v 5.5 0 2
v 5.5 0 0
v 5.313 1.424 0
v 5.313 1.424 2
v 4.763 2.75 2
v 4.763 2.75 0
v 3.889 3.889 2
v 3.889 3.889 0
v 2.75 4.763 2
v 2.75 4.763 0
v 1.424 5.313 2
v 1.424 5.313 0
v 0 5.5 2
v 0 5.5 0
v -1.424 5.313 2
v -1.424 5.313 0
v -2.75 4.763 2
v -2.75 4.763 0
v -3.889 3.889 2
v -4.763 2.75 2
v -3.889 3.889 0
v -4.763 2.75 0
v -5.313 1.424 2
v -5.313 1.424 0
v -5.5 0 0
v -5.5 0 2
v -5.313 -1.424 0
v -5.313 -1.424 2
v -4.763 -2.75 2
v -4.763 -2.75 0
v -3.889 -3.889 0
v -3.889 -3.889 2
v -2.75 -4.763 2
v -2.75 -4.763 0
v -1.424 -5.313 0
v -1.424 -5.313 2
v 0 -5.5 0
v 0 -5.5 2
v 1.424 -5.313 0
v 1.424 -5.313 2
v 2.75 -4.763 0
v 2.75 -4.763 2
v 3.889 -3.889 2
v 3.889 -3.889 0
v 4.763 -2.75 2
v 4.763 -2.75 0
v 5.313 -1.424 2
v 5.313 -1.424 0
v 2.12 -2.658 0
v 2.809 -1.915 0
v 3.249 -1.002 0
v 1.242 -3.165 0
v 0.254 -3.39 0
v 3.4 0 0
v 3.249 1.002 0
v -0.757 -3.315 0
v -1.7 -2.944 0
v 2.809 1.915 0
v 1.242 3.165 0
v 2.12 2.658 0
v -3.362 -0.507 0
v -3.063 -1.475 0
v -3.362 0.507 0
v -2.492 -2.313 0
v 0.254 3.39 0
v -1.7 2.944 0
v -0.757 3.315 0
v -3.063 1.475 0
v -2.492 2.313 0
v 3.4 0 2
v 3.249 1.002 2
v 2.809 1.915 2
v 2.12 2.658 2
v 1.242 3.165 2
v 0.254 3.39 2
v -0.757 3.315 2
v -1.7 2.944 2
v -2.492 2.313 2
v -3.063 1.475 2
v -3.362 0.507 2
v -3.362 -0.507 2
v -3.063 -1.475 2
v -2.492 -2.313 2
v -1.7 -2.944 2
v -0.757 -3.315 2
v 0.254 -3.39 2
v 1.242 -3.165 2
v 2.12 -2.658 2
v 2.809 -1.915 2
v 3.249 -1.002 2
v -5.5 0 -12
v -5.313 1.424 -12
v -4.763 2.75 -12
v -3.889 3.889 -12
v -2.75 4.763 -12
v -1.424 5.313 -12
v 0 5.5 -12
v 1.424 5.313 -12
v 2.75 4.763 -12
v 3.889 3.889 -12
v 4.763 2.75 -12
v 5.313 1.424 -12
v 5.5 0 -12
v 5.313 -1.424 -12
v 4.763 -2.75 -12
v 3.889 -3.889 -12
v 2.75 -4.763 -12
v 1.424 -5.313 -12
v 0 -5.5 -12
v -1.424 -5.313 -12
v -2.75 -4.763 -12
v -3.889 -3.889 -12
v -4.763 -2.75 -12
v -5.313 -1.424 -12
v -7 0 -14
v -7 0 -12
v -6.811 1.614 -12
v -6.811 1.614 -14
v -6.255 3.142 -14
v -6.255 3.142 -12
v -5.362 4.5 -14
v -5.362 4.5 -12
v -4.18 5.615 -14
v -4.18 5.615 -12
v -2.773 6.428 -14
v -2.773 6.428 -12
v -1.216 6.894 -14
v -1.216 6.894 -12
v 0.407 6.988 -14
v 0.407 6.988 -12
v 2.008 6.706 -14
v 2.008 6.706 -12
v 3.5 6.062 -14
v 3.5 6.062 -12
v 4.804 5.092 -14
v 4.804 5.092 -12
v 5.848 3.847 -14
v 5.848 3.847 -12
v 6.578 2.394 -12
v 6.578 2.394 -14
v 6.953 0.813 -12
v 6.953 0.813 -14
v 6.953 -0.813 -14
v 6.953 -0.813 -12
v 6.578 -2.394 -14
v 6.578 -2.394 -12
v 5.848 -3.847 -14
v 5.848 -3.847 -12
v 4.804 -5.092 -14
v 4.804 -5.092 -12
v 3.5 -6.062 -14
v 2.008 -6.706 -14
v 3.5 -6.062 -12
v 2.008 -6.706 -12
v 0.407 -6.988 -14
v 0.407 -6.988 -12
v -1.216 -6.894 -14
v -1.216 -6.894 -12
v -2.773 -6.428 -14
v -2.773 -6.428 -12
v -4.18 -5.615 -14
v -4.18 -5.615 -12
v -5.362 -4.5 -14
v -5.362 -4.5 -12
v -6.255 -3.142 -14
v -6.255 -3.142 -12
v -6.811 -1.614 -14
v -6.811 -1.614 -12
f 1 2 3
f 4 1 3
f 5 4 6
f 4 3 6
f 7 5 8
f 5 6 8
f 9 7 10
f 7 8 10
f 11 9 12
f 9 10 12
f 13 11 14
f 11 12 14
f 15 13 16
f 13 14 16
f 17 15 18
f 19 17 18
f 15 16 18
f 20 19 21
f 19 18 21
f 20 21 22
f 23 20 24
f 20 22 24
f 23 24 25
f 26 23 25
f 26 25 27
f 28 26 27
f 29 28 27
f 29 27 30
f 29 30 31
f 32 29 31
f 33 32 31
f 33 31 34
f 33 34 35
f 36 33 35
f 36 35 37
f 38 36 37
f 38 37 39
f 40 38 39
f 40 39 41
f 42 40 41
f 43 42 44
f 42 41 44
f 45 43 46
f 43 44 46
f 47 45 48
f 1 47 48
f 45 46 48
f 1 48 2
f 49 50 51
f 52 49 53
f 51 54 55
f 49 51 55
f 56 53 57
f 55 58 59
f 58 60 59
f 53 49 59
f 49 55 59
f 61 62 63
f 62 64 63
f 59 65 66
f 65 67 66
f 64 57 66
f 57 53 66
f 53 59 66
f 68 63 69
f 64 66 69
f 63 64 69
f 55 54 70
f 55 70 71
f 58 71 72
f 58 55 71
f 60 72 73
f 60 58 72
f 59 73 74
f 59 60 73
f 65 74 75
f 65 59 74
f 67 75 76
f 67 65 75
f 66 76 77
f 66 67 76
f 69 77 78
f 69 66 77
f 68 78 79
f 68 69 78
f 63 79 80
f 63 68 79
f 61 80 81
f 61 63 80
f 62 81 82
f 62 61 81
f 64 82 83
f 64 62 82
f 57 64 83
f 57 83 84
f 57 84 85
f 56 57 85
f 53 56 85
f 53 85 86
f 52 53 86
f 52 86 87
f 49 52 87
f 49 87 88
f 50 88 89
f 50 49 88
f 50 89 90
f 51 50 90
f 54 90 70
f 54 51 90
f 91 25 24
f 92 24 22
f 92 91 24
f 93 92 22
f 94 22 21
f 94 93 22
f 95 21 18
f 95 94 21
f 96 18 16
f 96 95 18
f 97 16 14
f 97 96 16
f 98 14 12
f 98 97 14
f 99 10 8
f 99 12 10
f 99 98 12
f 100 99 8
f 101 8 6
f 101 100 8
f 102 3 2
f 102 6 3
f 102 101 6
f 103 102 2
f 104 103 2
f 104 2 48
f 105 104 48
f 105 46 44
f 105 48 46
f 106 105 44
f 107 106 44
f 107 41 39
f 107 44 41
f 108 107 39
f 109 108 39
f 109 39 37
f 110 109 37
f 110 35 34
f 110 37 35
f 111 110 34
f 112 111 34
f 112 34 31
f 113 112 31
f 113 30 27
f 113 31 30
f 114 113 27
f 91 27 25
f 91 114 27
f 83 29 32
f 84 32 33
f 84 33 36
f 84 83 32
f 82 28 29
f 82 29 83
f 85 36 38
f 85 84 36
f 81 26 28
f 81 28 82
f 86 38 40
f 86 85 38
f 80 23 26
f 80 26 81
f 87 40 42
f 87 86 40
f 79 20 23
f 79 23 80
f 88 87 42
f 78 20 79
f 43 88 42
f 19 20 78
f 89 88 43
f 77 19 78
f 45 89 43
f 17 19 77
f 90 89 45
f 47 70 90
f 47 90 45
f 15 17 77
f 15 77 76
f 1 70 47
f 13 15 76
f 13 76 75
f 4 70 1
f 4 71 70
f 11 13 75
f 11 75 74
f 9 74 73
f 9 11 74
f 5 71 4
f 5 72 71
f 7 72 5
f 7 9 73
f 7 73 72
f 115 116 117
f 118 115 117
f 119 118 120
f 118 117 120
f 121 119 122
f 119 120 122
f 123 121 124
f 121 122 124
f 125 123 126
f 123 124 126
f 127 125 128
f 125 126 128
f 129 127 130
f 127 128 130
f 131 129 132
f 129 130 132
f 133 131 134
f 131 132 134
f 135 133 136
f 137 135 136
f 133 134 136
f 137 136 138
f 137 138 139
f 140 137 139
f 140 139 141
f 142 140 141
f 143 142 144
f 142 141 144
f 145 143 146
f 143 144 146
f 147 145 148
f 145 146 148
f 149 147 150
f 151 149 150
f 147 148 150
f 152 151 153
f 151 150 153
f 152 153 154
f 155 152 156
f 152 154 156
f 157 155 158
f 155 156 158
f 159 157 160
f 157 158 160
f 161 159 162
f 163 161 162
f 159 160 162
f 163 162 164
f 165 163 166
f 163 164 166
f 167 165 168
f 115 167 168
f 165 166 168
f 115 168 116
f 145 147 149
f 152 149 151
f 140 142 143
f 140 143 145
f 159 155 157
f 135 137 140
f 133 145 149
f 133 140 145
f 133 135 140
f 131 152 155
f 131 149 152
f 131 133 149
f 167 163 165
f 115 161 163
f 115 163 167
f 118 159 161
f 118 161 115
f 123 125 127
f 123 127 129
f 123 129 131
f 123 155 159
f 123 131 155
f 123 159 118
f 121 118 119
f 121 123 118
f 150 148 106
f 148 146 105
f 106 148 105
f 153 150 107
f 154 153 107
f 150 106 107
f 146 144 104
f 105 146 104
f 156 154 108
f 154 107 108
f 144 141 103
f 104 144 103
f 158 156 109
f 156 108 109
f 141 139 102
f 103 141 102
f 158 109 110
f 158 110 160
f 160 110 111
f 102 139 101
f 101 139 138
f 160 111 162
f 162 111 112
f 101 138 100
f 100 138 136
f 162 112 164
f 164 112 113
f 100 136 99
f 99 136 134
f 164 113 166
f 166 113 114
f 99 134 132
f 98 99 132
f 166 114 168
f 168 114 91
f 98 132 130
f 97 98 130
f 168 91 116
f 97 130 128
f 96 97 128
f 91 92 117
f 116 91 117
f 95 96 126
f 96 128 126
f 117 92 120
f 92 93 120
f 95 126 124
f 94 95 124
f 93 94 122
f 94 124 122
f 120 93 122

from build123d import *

# Parameters (mm, degrees)
SKETCH1_R      = 5.5
SKETCH1_R_2    = 3.4
EXTRUDE1_DEPTH = 2
EXTRUDE2_START = 12
SKETCH2_R      = 5.5
EXTRUDE2_DEPTH = 12
SKETCH3_R      = 7
EXTRUDE3_DEPTH = 2


with BuildPart() as part:
    # Sketch1 → Extrude1 (new body)
    with BuildSketch(Plane.XY):
        Circle(SKETCH1_R)
        Circle(SKETCH1_R_2, mode=Mode.SUBTRACT)
    extrude(amount=EXTRUDE1_DEPTH)

    # Sketch2 → Extrude2 (add)
    with BuildSketch(Plane(origin=(0, 0, 0), x_dir=(-1, 0, 0), z_dir=(0, 0, -1)).offset(EXTRUDE2_START)):
        Circle(SKETCH2_R)
    extrude(amount=-EXTRUDE2_DEPTH)

    # Sketch3 → Extrude3 (add)
    with BuildSketch(Plane(origin=(0, 0, -12), x_dir=(-1, 0, 0), z_dir=(0, 0, -1))):
        Circle(SKETCH3_R)
    extrude(amount=EXTRUDE3_DEPTH)


solid = part.part
